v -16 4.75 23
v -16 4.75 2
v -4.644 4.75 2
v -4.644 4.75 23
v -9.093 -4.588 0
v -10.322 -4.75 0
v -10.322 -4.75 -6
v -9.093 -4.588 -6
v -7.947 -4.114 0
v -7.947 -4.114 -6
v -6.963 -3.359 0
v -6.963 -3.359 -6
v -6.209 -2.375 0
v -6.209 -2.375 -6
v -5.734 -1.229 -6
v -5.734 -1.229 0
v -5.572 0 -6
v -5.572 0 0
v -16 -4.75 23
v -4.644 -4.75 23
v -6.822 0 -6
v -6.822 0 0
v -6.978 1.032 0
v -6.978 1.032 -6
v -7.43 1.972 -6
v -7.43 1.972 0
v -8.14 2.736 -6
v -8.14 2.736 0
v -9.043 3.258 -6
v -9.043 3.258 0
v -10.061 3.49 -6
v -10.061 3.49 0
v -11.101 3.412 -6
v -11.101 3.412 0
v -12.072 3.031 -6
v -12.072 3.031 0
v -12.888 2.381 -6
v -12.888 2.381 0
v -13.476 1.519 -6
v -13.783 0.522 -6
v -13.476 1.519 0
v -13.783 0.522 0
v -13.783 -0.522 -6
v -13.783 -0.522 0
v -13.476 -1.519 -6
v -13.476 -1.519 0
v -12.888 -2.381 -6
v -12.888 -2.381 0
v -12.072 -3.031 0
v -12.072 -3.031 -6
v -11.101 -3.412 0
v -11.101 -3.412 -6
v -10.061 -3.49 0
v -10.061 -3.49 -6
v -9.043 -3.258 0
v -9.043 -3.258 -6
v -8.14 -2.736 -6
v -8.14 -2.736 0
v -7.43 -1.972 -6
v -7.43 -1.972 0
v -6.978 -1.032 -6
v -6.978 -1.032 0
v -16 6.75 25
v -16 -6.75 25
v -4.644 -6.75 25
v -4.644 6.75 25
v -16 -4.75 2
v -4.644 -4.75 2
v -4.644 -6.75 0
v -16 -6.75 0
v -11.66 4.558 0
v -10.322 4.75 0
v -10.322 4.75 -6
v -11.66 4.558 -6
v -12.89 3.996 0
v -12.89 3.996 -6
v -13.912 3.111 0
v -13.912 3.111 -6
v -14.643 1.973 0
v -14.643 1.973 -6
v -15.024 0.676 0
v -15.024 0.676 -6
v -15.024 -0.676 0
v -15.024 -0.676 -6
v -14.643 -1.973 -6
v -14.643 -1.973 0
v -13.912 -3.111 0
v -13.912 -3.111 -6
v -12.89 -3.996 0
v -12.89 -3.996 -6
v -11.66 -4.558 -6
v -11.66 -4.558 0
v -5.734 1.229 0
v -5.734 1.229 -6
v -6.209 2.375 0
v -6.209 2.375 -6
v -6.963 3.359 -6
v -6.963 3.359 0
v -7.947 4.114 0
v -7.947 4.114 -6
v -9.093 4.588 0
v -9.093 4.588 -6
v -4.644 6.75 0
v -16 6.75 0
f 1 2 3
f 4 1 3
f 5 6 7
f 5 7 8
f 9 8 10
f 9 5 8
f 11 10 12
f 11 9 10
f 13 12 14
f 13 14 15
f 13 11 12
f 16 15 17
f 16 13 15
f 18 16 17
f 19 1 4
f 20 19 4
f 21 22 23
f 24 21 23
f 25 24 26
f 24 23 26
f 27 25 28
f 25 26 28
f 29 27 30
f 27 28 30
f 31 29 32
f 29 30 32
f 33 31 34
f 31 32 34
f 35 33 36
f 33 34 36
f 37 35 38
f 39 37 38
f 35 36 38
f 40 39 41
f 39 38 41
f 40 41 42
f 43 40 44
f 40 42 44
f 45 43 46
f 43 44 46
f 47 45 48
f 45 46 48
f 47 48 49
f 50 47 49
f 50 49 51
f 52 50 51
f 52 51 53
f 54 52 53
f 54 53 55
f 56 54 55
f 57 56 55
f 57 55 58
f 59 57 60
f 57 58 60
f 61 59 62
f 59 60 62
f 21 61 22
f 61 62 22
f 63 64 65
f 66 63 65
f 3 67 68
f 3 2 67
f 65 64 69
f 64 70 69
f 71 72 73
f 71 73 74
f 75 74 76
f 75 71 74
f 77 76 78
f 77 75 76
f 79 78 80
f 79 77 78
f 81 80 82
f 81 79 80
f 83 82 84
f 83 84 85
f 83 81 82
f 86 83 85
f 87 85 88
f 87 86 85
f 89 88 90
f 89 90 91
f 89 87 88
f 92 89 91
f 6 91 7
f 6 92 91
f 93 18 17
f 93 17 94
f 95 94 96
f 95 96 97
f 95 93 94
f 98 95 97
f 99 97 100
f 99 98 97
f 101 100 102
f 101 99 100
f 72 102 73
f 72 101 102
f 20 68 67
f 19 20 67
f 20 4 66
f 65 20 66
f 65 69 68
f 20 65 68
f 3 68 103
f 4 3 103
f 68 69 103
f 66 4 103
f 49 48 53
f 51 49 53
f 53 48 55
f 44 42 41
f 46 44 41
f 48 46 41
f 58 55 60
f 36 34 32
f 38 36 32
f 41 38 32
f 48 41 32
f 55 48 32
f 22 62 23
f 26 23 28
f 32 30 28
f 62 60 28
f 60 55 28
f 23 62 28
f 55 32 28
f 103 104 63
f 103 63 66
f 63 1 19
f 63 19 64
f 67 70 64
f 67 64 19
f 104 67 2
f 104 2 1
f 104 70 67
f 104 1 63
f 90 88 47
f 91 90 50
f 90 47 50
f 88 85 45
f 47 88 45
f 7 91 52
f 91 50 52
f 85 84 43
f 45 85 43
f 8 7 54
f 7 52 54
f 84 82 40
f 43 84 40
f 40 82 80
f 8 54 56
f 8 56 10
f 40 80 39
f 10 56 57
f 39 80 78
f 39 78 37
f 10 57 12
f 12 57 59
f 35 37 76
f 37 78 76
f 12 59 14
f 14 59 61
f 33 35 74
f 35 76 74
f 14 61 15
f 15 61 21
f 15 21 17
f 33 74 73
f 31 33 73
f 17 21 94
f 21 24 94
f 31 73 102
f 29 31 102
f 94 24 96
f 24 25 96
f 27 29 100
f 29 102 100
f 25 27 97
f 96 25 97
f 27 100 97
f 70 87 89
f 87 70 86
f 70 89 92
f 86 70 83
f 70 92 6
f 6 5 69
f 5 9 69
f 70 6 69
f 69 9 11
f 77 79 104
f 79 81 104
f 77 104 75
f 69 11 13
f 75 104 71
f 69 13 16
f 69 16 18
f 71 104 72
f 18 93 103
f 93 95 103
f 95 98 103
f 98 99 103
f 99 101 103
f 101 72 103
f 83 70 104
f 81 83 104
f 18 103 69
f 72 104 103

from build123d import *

# Parameters (mm, degrees)
F0_R     = 3.5
F1_DEPTH = 2
F2_DEPTH = 23
F3_W     = 11.3556964174
F3_H     = 13.5
F4_DEPTH = 2
F5_DEPTH = 6


with BuildPart() as f1:
    # F0 (on Top) → F1 (new body)
    with BuildSketch(Plane.XY):
        Polygon((-4.6443035826, -6.75), (-4.6443035826, -4.75), (-10.3221517913, -4.75), (-16, -4.75), (-16, -6.75), align=None)
        with BuildLine():
            Line((-10.3221517913, -4.75), (-4.6443035826, -4.75))
            Line((-4.6443035826, -4.75), (-4.6443035826, 4.75))
            Line((-4.6443035826, 4.75), (-10.3221517821, 4.75))
            ThreePointArc((-10.3221517821, 4.75), (-6.9633945774, 3.3587572074), (-5.5721517913, 0))
            ThreePointArc((-5.5721517913, 0), (-6.9633945807, -3.3587572106), (-10.3221517913, -4.75))
        make_face()
        with BuildLine():
            Line((-16, -4.75), (-10.3221517913, -4.75))
            ThreePointArc((-10.3221517913, -4.75), (-15.0721517913, 4.6e-09), (-10.3221517821, 4.75))
            Line((-10.3221517821, 4.75), (-16, 4.75))
            Line((-16, 4.75), (-16, -4.75))
        make_face()
        with BuildLine():
            ThreePointArc((-10.3221517821, 4.75), (-15.0721517913, 4.6e-09), (-10.3221517913, -4.75))
            ThreePointArc((-10.3221517913, -4.75), (-6.9633945807, -3.3587572106), (-5.5721517913, 0))
            ThreePointArc((-5.5721517913, 0), (-6.9633945774, 3.3587572074), (-10.3221517821, 4.75))
        make_face()
        with Locations((-10.3221517913, 0)):
            Circle(F0_R, mode=Mode.SUBTRACT)
        Polygon((-10.3221517821, 4.75), (-4.6443035826, 4.75), (-4.6443035826, 6.75), (-16, 6.75), (-16, 4.75), align=None)
        with Locations((-10.3221517913, 0)):
            Circle(F0_R)
    extrude(amount=F1_DEPTH)

    # F0 (on Top) → F2 (join)
    with BuildSketch(Plane.XY):
        Polygon((-10.3221517821, 4.75), (-4.6443035826, 4.75), (-4.6443035826, 6.75), (-16, 6.75), (-16, 4.75), align=None)
        Polygon((-4.6443035826, -6.75), (-4.6443035826, -4.75), (-10.3221517913, -4.75), (-16, -4.75), (-16, -6.75), align=None)
    extrude(amount=F2_DEPTH)

    # F3 (on face) → F4 (join)
    with BuildSketch(Plane.XY.offset(23)):
        with Locations((-10.3221517913, 0)):
            Rectangle(F3_W, F3_H)
    extrude(amount=F4_DEPTH)

    # F0 (on Top) → F5 (join)
    with BuildSketch(Plane.XY):
        with BuildLine():
            ThreePointArc((-10.3221517821, 4.75), (-15.0721517913, 4.6e-09), (-10.3221517913, -4.75))
            ThreePointArc((-10.3221517913, -4.75), (-6.9633945807, -3.3587572106), (-5.5721517913, 0))
            ThreePointArc((-5.5721517913, 0), (-6.9633945774, 3.3587572074), (-10.3221517821, 4.75))
        make_face()
        with Locations((-10.3221517913, 0)):
            Circle(F0_R, mode=Mode.SUBTRACT)
    extrude(amount=-F5_DEPTH)


solid = f1.part
